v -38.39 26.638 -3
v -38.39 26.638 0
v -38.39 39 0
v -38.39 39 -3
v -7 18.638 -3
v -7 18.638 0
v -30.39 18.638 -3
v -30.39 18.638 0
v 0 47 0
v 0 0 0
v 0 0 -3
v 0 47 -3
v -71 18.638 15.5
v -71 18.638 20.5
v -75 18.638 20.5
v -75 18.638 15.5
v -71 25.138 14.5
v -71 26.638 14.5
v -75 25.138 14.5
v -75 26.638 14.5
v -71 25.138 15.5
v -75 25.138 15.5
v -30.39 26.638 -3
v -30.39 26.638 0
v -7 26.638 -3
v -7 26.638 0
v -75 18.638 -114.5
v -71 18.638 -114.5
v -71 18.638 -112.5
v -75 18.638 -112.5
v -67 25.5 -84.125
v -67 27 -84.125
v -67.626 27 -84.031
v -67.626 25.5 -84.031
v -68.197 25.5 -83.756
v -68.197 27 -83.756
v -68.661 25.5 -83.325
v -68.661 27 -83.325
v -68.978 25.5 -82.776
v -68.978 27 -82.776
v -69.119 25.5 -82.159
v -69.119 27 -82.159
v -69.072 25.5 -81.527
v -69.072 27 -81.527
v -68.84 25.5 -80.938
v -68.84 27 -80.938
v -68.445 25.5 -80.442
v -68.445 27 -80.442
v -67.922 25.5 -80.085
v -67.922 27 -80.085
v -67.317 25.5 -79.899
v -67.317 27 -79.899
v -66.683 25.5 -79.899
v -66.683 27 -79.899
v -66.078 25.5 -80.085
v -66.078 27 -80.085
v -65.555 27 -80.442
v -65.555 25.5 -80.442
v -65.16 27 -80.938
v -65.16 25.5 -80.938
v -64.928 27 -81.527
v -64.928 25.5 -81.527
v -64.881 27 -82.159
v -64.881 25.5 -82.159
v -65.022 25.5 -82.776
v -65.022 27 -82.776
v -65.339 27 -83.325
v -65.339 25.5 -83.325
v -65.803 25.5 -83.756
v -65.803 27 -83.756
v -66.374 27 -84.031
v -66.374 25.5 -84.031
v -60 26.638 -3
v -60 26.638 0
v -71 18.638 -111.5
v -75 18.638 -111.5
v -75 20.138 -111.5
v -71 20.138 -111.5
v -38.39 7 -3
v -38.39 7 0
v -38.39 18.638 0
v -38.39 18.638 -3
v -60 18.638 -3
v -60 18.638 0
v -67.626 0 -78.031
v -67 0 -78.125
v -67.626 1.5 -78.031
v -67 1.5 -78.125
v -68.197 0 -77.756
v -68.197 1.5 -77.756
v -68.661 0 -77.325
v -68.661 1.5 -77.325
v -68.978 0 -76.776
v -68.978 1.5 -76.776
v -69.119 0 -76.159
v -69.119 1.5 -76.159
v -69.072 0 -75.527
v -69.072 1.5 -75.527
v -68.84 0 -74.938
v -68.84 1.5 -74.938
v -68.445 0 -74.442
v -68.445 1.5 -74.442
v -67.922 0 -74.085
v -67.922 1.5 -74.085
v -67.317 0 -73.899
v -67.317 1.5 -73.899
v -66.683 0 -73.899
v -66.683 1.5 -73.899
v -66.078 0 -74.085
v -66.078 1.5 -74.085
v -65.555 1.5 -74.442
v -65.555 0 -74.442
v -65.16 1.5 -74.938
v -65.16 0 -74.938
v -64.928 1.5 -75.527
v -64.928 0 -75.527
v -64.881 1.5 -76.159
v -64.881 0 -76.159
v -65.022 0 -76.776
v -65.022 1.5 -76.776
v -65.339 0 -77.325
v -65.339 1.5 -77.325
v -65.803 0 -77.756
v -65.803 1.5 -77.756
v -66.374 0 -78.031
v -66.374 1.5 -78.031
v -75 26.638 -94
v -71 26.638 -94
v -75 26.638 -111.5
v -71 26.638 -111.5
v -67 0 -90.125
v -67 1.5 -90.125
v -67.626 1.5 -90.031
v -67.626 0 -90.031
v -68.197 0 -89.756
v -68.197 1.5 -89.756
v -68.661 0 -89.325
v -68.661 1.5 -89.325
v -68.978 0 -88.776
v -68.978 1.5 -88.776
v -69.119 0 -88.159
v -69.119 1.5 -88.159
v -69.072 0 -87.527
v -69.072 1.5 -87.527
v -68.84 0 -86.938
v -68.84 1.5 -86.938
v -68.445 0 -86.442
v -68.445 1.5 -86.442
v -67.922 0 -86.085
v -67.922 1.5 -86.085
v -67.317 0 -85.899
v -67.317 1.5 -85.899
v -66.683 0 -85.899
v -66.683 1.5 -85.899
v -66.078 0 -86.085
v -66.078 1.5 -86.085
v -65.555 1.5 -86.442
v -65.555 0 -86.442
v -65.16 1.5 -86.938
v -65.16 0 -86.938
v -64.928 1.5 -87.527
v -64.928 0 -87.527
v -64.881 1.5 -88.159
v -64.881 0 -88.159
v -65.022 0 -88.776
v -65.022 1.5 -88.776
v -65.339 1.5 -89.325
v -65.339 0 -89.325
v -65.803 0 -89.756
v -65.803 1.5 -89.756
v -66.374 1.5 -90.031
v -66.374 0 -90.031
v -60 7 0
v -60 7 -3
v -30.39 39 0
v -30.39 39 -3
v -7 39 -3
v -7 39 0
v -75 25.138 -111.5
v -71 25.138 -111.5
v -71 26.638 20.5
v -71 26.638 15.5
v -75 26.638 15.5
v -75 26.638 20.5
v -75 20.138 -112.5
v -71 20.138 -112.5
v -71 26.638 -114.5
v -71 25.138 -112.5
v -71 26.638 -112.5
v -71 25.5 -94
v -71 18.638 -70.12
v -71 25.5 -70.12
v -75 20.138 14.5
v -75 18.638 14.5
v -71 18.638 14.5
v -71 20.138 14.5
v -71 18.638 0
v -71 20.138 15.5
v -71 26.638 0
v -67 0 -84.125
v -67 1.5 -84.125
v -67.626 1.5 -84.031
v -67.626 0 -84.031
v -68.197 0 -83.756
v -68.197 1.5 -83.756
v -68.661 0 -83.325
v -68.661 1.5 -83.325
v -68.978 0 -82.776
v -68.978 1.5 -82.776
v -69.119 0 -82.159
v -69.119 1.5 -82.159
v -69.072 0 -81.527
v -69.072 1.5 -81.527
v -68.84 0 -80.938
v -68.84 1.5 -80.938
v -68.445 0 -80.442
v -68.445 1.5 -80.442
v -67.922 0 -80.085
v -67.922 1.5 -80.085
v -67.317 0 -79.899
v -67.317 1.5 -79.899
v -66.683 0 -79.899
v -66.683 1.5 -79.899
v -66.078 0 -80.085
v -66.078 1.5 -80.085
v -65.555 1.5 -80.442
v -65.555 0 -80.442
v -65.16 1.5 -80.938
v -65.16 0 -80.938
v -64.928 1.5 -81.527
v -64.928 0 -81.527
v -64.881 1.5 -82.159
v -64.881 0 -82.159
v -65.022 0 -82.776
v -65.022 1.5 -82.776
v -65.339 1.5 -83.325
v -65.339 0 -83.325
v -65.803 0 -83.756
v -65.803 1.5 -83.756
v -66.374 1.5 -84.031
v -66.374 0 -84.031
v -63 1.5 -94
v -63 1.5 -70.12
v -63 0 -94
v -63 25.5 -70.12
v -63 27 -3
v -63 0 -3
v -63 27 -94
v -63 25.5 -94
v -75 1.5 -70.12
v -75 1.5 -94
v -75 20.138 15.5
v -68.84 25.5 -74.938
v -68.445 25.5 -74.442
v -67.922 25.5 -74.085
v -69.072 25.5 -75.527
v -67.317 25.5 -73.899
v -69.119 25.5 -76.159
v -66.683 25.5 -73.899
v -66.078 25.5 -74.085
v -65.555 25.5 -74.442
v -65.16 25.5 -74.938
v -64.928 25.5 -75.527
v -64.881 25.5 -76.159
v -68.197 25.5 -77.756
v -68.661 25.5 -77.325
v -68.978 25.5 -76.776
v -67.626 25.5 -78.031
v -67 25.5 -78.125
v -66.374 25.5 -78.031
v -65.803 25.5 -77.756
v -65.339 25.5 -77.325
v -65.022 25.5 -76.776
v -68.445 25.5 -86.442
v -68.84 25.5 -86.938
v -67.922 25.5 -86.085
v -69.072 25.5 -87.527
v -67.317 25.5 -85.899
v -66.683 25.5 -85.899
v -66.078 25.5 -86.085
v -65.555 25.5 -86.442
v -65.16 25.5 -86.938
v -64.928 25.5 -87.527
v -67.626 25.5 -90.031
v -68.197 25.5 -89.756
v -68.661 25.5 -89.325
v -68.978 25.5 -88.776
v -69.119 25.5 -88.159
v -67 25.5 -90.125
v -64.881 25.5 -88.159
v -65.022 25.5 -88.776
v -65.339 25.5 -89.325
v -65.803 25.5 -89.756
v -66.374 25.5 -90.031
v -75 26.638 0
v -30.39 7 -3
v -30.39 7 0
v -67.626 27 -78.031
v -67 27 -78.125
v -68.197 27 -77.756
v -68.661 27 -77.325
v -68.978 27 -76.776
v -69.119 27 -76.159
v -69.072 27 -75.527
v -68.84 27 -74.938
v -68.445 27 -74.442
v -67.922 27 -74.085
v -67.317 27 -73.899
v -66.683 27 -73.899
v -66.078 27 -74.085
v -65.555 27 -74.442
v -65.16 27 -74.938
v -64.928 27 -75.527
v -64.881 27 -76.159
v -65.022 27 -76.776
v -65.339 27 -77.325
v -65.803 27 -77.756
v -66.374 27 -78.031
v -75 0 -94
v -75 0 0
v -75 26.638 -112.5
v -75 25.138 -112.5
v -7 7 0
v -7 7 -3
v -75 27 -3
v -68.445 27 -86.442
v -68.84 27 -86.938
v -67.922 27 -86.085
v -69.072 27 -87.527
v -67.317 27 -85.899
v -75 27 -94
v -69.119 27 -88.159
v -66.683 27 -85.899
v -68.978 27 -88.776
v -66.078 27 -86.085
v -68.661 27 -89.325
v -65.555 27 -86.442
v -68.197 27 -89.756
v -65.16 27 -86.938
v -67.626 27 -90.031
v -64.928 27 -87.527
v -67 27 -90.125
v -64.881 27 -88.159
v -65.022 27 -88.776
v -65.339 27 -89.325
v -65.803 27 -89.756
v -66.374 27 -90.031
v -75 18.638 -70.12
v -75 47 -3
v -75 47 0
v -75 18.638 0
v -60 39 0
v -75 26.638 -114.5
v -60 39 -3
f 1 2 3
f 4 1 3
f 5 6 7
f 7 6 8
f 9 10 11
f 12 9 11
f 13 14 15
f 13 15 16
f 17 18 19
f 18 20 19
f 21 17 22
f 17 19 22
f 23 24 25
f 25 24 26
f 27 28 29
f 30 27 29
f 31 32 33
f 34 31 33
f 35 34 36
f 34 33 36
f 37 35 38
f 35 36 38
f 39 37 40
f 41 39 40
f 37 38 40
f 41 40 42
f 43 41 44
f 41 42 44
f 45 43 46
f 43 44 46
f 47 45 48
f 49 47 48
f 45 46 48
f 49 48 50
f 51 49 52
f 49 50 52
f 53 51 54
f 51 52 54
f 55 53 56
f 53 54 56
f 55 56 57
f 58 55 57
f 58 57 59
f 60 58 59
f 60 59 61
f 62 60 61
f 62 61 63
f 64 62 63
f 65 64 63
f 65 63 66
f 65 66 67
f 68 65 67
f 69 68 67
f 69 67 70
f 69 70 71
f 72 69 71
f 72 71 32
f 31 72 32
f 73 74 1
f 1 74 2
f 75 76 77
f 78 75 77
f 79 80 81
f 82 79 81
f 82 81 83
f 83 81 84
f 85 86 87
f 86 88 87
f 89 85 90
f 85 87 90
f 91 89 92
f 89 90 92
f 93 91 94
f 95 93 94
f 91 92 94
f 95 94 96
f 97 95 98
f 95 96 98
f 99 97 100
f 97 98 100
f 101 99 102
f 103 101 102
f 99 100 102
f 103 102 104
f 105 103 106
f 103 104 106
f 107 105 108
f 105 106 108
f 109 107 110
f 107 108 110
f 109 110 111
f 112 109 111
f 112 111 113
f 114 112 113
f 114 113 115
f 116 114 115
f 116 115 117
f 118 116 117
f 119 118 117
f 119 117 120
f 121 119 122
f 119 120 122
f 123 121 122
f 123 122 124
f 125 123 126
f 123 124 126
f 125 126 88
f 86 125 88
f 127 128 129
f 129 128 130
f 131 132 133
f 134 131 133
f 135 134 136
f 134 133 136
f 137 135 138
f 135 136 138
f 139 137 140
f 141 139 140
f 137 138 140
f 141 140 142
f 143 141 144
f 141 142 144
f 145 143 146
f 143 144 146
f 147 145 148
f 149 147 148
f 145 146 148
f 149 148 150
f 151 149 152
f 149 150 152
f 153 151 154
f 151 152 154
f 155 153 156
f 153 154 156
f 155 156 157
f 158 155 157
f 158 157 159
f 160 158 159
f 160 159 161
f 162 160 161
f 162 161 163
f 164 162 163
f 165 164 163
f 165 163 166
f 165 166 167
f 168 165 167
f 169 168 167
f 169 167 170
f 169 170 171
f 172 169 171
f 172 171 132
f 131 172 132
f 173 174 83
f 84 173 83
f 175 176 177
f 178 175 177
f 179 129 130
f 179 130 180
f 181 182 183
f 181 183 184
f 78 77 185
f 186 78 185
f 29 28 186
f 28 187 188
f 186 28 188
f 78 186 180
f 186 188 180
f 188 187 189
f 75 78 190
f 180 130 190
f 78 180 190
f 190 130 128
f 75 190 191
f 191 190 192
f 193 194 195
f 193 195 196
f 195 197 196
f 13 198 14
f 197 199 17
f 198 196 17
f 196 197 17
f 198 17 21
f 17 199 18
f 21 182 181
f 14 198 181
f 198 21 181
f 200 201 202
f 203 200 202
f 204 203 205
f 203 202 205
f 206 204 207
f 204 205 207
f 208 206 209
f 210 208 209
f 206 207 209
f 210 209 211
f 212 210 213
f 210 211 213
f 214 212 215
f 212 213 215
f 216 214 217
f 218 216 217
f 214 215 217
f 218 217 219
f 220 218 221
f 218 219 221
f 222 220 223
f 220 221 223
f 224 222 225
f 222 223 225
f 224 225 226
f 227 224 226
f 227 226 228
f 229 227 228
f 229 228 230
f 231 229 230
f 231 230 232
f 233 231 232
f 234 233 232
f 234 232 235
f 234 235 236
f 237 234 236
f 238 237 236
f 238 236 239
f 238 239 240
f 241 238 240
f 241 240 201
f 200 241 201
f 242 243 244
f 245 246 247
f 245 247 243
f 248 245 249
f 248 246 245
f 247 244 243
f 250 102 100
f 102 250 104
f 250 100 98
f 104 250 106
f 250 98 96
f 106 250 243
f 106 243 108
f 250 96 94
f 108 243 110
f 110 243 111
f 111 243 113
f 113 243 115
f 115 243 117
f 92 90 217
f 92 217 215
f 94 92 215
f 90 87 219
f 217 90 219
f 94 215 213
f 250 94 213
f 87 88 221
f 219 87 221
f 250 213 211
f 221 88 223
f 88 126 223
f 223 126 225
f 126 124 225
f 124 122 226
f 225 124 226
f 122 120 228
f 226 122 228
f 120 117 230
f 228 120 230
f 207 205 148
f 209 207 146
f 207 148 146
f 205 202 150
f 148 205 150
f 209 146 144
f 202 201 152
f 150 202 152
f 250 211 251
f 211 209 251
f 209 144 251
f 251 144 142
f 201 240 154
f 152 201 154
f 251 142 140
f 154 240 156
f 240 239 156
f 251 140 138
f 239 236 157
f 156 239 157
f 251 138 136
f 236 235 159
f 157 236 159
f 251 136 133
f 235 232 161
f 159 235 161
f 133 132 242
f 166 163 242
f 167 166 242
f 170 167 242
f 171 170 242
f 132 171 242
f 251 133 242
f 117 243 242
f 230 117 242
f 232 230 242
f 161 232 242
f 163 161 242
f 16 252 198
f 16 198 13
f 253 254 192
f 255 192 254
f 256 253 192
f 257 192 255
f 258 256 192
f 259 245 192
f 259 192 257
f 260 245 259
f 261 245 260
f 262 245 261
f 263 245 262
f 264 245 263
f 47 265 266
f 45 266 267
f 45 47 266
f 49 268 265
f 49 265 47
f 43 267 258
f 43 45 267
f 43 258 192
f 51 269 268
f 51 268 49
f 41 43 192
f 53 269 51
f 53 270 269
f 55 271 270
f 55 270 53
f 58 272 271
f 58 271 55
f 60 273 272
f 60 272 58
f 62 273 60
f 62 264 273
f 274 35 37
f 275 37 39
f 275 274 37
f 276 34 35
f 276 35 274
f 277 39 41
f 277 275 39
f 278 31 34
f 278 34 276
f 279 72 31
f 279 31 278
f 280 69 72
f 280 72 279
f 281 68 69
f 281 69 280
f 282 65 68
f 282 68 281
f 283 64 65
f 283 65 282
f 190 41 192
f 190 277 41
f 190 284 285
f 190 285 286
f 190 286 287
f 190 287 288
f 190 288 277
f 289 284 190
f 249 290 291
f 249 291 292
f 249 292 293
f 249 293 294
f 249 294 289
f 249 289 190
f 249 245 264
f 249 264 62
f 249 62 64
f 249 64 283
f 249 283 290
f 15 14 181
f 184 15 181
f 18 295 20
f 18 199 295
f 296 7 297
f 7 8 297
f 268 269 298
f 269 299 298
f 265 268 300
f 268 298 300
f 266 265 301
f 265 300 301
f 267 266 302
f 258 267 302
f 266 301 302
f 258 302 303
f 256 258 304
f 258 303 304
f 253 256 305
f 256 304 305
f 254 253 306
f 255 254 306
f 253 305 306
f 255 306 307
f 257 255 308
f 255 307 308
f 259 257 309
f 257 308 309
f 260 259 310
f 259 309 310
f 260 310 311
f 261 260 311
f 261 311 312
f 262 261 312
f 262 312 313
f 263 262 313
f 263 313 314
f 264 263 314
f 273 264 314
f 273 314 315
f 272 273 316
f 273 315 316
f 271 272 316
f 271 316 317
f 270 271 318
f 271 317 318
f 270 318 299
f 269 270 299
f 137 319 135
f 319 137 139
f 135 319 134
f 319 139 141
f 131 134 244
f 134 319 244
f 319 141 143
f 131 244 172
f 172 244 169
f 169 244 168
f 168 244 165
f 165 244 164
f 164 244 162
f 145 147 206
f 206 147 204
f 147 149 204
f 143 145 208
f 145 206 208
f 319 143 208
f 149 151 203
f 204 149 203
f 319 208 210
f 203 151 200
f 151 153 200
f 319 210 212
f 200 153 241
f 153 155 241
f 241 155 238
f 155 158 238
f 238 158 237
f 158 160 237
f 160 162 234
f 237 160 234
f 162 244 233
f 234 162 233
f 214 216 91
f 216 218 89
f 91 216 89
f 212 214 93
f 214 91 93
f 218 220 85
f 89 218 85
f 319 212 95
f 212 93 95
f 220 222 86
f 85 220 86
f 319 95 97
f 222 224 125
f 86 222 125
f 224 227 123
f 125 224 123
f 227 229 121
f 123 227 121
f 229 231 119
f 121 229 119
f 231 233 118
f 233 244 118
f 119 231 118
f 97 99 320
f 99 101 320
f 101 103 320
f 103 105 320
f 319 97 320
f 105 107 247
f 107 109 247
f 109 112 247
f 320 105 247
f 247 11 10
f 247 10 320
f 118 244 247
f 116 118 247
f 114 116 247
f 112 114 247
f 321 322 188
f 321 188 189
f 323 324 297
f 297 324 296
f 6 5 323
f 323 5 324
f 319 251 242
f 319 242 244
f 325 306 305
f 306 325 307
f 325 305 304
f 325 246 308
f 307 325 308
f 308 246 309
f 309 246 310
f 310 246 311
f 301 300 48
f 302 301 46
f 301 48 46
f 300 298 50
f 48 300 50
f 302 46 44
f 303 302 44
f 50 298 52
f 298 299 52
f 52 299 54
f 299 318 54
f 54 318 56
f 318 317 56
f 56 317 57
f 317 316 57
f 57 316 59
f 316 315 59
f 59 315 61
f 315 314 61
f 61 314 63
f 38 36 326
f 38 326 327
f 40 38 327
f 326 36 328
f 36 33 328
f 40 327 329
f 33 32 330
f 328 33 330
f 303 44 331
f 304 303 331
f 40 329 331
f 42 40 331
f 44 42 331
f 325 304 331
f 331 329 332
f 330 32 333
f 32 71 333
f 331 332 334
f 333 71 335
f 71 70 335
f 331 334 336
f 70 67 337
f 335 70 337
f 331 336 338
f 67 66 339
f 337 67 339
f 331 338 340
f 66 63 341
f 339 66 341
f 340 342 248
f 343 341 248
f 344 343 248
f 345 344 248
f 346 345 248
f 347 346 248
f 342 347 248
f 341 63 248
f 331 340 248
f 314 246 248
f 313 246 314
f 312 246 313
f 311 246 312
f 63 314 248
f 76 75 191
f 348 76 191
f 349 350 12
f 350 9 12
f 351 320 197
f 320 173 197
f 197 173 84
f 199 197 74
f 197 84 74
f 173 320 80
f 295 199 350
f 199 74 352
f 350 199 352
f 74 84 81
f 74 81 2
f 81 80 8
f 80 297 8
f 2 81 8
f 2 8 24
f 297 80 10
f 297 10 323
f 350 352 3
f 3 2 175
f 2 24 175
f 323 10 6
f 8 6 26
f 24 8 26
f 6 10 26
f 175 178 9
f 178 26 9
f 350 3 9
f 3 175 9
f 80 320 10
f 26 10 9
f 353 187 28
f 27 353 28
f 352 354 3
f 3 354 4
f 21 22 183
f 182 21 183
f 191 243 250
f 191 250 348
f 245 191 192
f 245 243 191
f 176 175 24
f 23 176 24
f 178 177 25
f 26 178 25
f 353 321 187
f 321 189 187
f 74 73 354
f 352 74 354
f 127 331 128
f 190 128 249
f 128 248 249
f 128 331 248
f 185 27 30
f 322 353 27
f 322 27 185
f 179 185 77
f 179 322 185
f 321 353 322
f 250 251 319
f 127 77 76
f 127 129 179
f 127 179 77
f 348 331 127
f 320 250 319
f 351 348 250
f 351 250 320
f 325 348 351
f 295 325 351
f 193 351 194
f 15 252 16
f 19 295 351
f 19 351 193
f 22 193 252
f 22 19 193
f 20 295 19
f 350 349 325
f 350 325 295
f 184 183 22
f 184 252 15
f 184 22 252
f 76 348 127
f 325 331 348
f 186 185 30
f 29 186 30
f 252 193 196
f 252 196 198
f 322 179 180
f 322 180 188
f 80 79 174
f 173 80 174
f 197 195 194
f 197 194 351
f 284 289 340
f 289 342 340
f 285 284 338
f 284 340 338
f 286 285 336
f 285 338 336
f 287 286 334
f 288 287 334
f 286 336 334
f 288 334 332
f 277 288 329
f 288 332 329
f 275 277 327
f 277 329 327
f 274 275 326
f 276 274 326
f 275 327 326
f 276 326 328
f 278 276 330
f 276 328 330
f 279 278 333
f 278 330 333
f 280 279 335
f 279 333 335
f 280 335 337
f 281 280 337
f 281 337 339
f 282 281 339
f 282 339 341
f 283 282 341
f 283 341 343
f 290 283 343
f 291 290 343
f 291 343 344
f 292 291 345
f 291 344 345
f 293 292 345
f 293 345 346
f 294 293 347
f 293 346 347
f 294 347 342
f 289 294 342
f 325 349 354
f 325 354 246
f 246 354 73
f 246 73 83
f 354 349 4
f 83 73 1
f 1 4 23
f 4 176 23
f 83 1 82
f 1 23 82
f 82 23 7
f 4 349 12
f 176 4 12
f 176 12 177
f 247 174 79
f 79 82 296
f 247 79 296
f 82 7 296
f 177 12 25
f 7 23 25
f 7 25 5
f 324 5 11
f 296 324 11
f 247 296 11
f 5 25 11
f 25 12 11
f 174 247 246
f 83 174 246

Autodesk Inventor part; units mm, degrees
ref_plane "YZ Plane" through (0, 0, 0) normal (1, 0, 0) x (0, 1, 0)
ref_plane "XZ Plane" through (0, 0, 0) normal (0, 1, 0) x (-1, 0, 0)
ref_plane "XY Plane" through (0, 0, 0) normal (0, 0, 1) x (1, 0, 0)
sketch "Sketch3" plane through (0, 0, 0) normal (0, 1, 0) x (-1, 0, 0)
  line L0 (0, 0) -> (70, 0)
  line L1 (70, 0) -> (70, -70)
  line L2 (70, -70) -> (70, -94)
  line L3 (70, -94) -> (64, -94)
  line L4 (64, -94) -> (64, -70)
  line L5 (64, -3) -> (0, -3)
  line L6 (0, -3) -> (0, 0)
  line L7 (64, -70) -> (67, -70)
  line L8 (67, -70) -> (67, -3)
  line L9 (67, -3) -> (64, -3)
  circle A0 centre (67, -82) radius 2.125
  circle A1 centre (67, -76) radius 2.125
  circle A2 centre (67, -88) radius 2.125
  dimension "d26" = 70
  dimension "d27" = 70
  dimension "d29" = 6
  dimension "d55" = 4.25
  dimension "d56" = 4.25
  dimension "d57" = 4.25
  dimension "d59" = 6
  dimension "d60" = 6
  dimension "d61" = 6
extrude "Extrusion2" add sketch "Sketch3" along normal blind 27 contours L0 L1 L2 L3 L4 L7 L8 L9 L5 L6 | A0 | A1 | A2
sketch "Sketch4" plane through (0, 27, 0) normal (0, 1, 0) x (1, 0, 0)
  line L0 (-70, 0) -> (0, 0) projected
  line L1 (0, 0) -> (0, 3) projected
  line L2 (-70, 0) -> (0, 0)
  line L3 (0, 0) -> (0, 3)
  line L4 (0, 3) -> (-70, 3)
  line L5 (-70, 3) -> (-70, 0)
extrude "Extrusion3" add sketch "Sketch4" along normal blind 20
sketch "Sketch5" plane through (-70, 0, -94) normal (-1, 0, 0) x (0, 0, 1)
  line L0 (-0.1204, 1.5) -> (23.8796, 1.5)
  line L1 (23.8796, 1.5) -> (23.8796, 25.5)
  line L2 (23.8796, 25.5) -> (-0.1204, 25.5)
  line L3 (-0.1204, 25.5) -> (-0.1204, 1.5)
  line L4 (94, 0) -> (0, 0) projected
  dimension "d36" = 24
  dimension "d37" = 24
  dimension "d38" = 1.5
extrude "Extrusion4" cut sketch "Sketch5" against normal blind 10
sketch "Sketch9" plane through (0, 0, -3) normal (0, 0, -1) x (-1, 0, 0)
  line L0 (7, 7) -> (60, 7)
  line L1 (60, 7) -> (60, 39)
  line L2 (60, 39) -> (7, 39)
  line L3 (7, 39) -> (7, 7)
  line L4 (0, 0) -> (0, 47) projected
  line L5 (67, 0) -> (0, 0) projected
  dimension "d45" = 53
  dimension "d46" = 32
  dimension "d47" = 7
  dimension "d48" = 7
extrude "Extrusion5" cut sketch "Sketch9" against normal blind 10
sketch "Sketch10" plane through (-70, 0, 0) normal (0, 0, 1) x (1, 0, 0)
  line L0 (10, 39) -> (10, 7) projected
  line L1 (63, 7) -> (63, 39) projected
  line L2 (63, 26.6385) -> (63, 18.6385)
  line L3 (10, 18.6385) -> (10, 26.6385)
  line L4 (63, 39) -> (10, 39) projected
  line L5 (10, 7) -> (63, 7) projected
  line L6 (31.6097, 39) -> (39.6097, 39)
  line L7 (39.6097, 39) -> (39.6097, 7)
  line L8 (39.6097, 7) -> (31.6097, 7)
  line L9 (31.6097, 7) -> (31.6097, 18.6385)
  line L10 (31.6097, 26.6385) -> (31.6097, 39)
  line L11 (10, 26.6385) -> (31.6097, 26.6385)
  line L12 (39.6097, 26.6385) -> (63, 26.6385)
  line L13 (63, 18.6385) -> (39.6097, 18.6385)
  line L14 (31.6097, 18.6385) -> (10, 18.6385)
  point P0 (70, 0)
  dimension "d51" = 8
  dimension "d52" = 8
extrude "Extrusion6" add sketch "Sketch10" against normal blind 3 contours L11 L10 L4 L7 L5 L9 L14 L0 | L12 L1 L13 L7
sketch "Sketch11" plane through (0, 0, 0) normal (0, -1, 0) x (1, 0, 0)
  point P0 (0, 0)
sketch "Sketch12" plane through (0, 0, 0) normal (0, -1, 0) x (1, 0, 0)
  circle A0 centre (-67, -82) radius 2.125
  circle A1 centre (-67, -76) radius 2.125
  circle A2 centre (-67, -88) radius 2.125
  line L0 (-64, -70) -> (-67, -70) projected
  point P0 (0, 0)
  dimension "d62" = 4.25
  dimension "d63" = 4.25
  dimension "d64" = 4.25
  dimension "d65" = 6
  dimension "d66" = 6
  dimension "d67" = 6
hole "Hole2" at (-67, 0, -88) at (-67, 0, -82) at (-67, 0, -76) direction (0, 1, 0) diameter 4.25 end through all
sketch "Sketch15" plane through (-67, 0, -3) normal (1, 0, 0) x (0, 0, -1)
  line L0 (67, 0) -> (67, 27) projected
  line L1 (67, 0) -> (0, 0) projected
  line L2 (67, 0) -> (0, 0)
  line L3 (0, 0) -> (0, 27) projected
  line L4 (0, 0) -> (0, 27)
  line L5 (0, 27) -> (67, 27)
  line L6 (67.1204, 25.5) -> (67.1204, 1.5) projected
  line L7 (67.1204, 25.5) -> (67.1204, 1.5)
  line L8 (67.1204, 1.5) -> (67, 0)
  line L9 (67, 27) -> (67, 0)
  point P0 (-3, 0)
extrude "Extrusion7" add sketch "Sketch15" along normal blind 3
sketch "Sketch18" plane through (-64, 0, -3) normal (1, 0, 0) x (0, 0, -1)
  line L0 (0, 0) -> (0, 27) projected
  line L1 (0, 27) -> (0, 0)
  line L2 (91, 0) -> (0, 0) projected
  line L3 (0, 0) -> (91, 0)
  line L4 (91, 0) -> (91, 1.5) projected
  line L5 (91, 0) -> (91, 1.5)
  line L6 (67.1204, 1.5) -> (67.1204, 25.5) projected
  line L7 (91, 1.5) -> (67.1204, 1.5)
  line L8 (67.1204, 25.5) -> (67.1204, 1.5) projected
  line L9 (67.1204, 1.5) -> (67.1204, 25.5)
  line L10 (67.1204, 25.5) -> (91, 25.5) projected
  line L11 (67.1204, 25.5) -> (91, 25.5)
  line L12 (91, 27) -> (0, 27) projected
  line L13 (91, 25.5) -> (91, 27)
  line L14 (91, 27) -> (0, 27)
  point P0 (-3, 0)
extrude "Extrusion8" add sketch "Sketch18" along normal blind 1
sketch "Sketch19" plane through (-70, 0, -94) normal (-1, 0, 0) x (0, 0, 1)
  line L0 (94, 47) -> (94, 0)
  line L1 (91, 0) -> (0, 0) projected
  line L2 (94, 0) -> (0, 0)
  line L3 (0, 0) -> (0, 1.5) projected
  line L4 (0, 0) -> (0, 1.5)
  line L5 (23.8796, 25.5) -> (23.8796, 1.5) projected
  line L6 (0, 1.5) -> (23.8796, 1.5)
  line L7 (23.8796, 1.5) -> (23.8796, 25.5)
  line L8 (23.8796, 25.5) -> (0, 25.5) projected
  line L9 (23.8796, 25.5) -> (0, 25.5)
  line L10 (0, 27) -> (91, 27) projected
  line L11 (0, 25.5) -> (0, 27)
  line L12 (0, 27) -> (91, 27)
  line L13 (91, 27) -> (91, 47) projected
  line L14 (91, 27) -> (91, 47)
  line L15 (91, 47) -> (94, 47) projected
  line L16 (91, 47) -> (94, 47)
extrude "Extrusion9" add sketch "Sketch19" along normal blind 1
sketch "Sketch20" plane through (-71, 0, -94) normal (-1, 0, 0) x (0, 0, 1)
  line L0 (94, 26.6385) -> (94, 39) projected
  line L1 (94, 26.6385) -> (114.5, 26.6385)
  line L2 (114.5, 26.6385) -> (114.5, 18.6385)
  line L3 (94, 18.6385) -> (94, 7) projected
  line L4 (114.5, 18.6385) -> (94, 18.6385)
  line L5 (94, 18.6385) -> (0, 18.6385)
  line L6 (0, 18.6385) -> (-20.5, 18.6385)
  line L7 (-20.5, 18.6385) -> (-20.5, 26.6385)
  line L8 (-20.5, 26.6385) -> (94, 26.6385)
  point P0 (94, 0)
  dimension "d81" = 20.5
  dimension "d82" = 94
  dimension "d83" = 20.5
  dimension "d84" = 180
extrude "Extrusion10" add sketch "Sketch20" along normal blind 2
sketch "Sketch21" plane through (-71, 0, -94) normal (-1, 0, 0) x (0, 0, 1)
  line L0 (94, 18.6385) -> (94, 7) projected
  line L1 (94, 0) -> (94, 18.6385)
  line L2 (94, 18.6385) -> (23.8796, 18.6385) projected
  line L3 (94, 18.6385) -> (23.8796, 18.6385)
  line L4 (23.8796, 1.5) -> (23.8796, 25.5) projected
  line L5 (23.8796, 18.6385) -> (23.8796, 1.5)
  line L6 (91, 0) -> (0, 0) projected
  line L7 (23.8796, 1.5) -> (0, 1.5) projected
  line L8 (23.8796, 1.5) -> (0, 1.5)
  line L9 (0, 1.5) -> (0, 0) projected
  line L10 (0, 1.5) -> (0, 0)
  line L11 (0, 0) -> (94, 0)
extrude "Extrusion11" add sketch "Sketch21" along normal blind 2
sketch "Sketch22" plane through (-71, 0, -94) normal (-1, 0, 0) x (0, 0, 1)
  line L0 (91, 27) -> (0, 27) projected
  line L1 (0, 27) -> (0, 26.6385) projected
  line L2 (0, 27) -> (0, 26.6385)
  line L3 (0, 25.5) -> (0, 27) projected
  line L4 (94, 26.6385) -> (94, 47) projected
  line L5 (0, 26.6385) -> (94, 26.6385)
  line L6 (94, 26.6385) -> (94, 47)
  line L7 (94, 47) -> (91, 47) projected
  line L8 (94, 47) -> (91, 47)
  line L9 (91, 47) -> (91, 27) projected
  line L10 (91, 47) -> (91, 27)
  line L11 (91, 27) -> (0, 27)
  point P0 (94, 0)
extrude "Extrusion12" add sketch "Sketch22" along normal blind 2
sketch "Sketch23" plane through (-73, 0, -94) normal (-1, 0, 0) x (0, 0, 1)
  line L0 (94, 0) -> (94, 47) projected
  line L1 (94, 18.6385) -> (94, 26.6385) projected
  line L2 (94, 0) -> (94, 18.6385)
  line L3 (114.5, 18.6385) -> (114.5, 26.6385) projected
  line L4 (94, 18.6385) -> (114.5, 18.6385)
  line L5 (114.5, 18.6385) -> (114.5, 26.6385)
  line L6 (114.5, 26.6385) -> (94, 26.6385)
  line L7 (94, 26.6385) -> (94, 47)
  line L8 (94, 47) -> (91, 47) projected
  line L9 (94, 47) -> (91, 47)
  line L10 (0, 27) -> (91, 27) projected
  line L11 (91, 47) -> (91, 27)
  line L12 (91, 26.6385) -> (91, 39) projected
  line L13 (91, 27) -> (0, 27)
  line L14 (0, 26.6385) -> (-20.5, 26.6385) projected
  line L15 (0, 27) -> (0, 26.6385)
  line L16 (0, 25.5) -> (0, 27) projected
  line L17 (0, 26.6385) -> (-20.5, 26.6385)
  line L18 (-20.5, 26.6385) -> (-20.5, 18.6385) projected
  line L19 (-20.5, 26.6385) -> (-20.5, 18.6385)
  line L20 (-20.5, 18.6385) -> (23.8796, 18.6385) projected
  line L21 (-20.5, 18.6385) -> (23.8796, 18.6385)
  line L22 (23.8796, 18.6385) -> (23.8796, 1.5) projected
  line L23 (23.8796, 18.6385) -> (23.8796, 1.5)
  line L24 (0, 1.5) -> (0, 0) projected
  line L25 (23.8796, 1.5) -> (0, 1.5)
  line L26 (0, 1.5) -> (0, 0)
  line L27 (0, 0) -> (94, 0) projected
  line L28 (0, 0) -> (94, 0)
extrude "Extrusion13" add sketch "Sketch23" along normal blind 2
sketch "Sketch24" plane through (-75, 0, -94) normal (-1, 0, 0) x (0, 0, 1)
  line L0 (-17.5, 26.6385) -> (-17.5, 25.1385)
  line L1 (-17.5, 25.1385) -> (-18.5, 25.1385)
  line L2 (-18.5, 25.1385) -> (-18.5, 26.6385)
  line L3 (-17.5, 26.6385) -> (-17.5, 25.1385)
  line L4 (-17.5, 26.6385) -> (-18.5, 26.6385)
  line L5 (-20.5, 26.6385) -> (0, 26.6385) projected
  line L6 (-20.5, 18.6385) -> (-20.5, 26.6385) projected
  line L7 (-20.5, 22.6385) -> (-27.0892, 22.6385)
  line L8 (-17.5, 18.6385) -> (-17.5, 20.1385)
  line L9 (-17.5, 20.1385) -> (-18.5, 20.1385)
  line L10 (-18.5, 20.1385) -> (-18.5, 18.6385)
  line L11 (-17.5, 18.6385) -> (-18.5, 18.6385)
  line L12 (91, 0) -> (0, 0) projected
  line L13 (45.5, 0) -> (45.5, 18.6385)
  line L14 (108.5, 26.6385) -> (108.5, 25.1385)
  line L15 (108.5, 25.1385) -> (109.5, 25.1385)
  line L16 (109.5, 25.1385) -> (109.5, 26.6385)
  line L17 (108.5, 18.6385) -> (108.5, 20.1385)
  line L18 (108.5, 20.1385) -> (109.5, 20.1385)
  line L19 (109.5, 20.1385) -> (109.5, 18.6385)
  line L20 (108.5, 18.6385) -> (109.5, 18.6385)
  line L21 (108.5, 26.6385) -> (109.5, 26.6385)
  line L22 (94, 26.6385) -> (114.5, 26.6385) projected
  point P0 (94, 0)
  dimension "d93" = 17.5
  dimension "d94" = 1.5
  dimension "d95" = 1
extrude "Extrusion14" cut sketch "Sketch24" against normal through all
properties part number "GrapperRight"
